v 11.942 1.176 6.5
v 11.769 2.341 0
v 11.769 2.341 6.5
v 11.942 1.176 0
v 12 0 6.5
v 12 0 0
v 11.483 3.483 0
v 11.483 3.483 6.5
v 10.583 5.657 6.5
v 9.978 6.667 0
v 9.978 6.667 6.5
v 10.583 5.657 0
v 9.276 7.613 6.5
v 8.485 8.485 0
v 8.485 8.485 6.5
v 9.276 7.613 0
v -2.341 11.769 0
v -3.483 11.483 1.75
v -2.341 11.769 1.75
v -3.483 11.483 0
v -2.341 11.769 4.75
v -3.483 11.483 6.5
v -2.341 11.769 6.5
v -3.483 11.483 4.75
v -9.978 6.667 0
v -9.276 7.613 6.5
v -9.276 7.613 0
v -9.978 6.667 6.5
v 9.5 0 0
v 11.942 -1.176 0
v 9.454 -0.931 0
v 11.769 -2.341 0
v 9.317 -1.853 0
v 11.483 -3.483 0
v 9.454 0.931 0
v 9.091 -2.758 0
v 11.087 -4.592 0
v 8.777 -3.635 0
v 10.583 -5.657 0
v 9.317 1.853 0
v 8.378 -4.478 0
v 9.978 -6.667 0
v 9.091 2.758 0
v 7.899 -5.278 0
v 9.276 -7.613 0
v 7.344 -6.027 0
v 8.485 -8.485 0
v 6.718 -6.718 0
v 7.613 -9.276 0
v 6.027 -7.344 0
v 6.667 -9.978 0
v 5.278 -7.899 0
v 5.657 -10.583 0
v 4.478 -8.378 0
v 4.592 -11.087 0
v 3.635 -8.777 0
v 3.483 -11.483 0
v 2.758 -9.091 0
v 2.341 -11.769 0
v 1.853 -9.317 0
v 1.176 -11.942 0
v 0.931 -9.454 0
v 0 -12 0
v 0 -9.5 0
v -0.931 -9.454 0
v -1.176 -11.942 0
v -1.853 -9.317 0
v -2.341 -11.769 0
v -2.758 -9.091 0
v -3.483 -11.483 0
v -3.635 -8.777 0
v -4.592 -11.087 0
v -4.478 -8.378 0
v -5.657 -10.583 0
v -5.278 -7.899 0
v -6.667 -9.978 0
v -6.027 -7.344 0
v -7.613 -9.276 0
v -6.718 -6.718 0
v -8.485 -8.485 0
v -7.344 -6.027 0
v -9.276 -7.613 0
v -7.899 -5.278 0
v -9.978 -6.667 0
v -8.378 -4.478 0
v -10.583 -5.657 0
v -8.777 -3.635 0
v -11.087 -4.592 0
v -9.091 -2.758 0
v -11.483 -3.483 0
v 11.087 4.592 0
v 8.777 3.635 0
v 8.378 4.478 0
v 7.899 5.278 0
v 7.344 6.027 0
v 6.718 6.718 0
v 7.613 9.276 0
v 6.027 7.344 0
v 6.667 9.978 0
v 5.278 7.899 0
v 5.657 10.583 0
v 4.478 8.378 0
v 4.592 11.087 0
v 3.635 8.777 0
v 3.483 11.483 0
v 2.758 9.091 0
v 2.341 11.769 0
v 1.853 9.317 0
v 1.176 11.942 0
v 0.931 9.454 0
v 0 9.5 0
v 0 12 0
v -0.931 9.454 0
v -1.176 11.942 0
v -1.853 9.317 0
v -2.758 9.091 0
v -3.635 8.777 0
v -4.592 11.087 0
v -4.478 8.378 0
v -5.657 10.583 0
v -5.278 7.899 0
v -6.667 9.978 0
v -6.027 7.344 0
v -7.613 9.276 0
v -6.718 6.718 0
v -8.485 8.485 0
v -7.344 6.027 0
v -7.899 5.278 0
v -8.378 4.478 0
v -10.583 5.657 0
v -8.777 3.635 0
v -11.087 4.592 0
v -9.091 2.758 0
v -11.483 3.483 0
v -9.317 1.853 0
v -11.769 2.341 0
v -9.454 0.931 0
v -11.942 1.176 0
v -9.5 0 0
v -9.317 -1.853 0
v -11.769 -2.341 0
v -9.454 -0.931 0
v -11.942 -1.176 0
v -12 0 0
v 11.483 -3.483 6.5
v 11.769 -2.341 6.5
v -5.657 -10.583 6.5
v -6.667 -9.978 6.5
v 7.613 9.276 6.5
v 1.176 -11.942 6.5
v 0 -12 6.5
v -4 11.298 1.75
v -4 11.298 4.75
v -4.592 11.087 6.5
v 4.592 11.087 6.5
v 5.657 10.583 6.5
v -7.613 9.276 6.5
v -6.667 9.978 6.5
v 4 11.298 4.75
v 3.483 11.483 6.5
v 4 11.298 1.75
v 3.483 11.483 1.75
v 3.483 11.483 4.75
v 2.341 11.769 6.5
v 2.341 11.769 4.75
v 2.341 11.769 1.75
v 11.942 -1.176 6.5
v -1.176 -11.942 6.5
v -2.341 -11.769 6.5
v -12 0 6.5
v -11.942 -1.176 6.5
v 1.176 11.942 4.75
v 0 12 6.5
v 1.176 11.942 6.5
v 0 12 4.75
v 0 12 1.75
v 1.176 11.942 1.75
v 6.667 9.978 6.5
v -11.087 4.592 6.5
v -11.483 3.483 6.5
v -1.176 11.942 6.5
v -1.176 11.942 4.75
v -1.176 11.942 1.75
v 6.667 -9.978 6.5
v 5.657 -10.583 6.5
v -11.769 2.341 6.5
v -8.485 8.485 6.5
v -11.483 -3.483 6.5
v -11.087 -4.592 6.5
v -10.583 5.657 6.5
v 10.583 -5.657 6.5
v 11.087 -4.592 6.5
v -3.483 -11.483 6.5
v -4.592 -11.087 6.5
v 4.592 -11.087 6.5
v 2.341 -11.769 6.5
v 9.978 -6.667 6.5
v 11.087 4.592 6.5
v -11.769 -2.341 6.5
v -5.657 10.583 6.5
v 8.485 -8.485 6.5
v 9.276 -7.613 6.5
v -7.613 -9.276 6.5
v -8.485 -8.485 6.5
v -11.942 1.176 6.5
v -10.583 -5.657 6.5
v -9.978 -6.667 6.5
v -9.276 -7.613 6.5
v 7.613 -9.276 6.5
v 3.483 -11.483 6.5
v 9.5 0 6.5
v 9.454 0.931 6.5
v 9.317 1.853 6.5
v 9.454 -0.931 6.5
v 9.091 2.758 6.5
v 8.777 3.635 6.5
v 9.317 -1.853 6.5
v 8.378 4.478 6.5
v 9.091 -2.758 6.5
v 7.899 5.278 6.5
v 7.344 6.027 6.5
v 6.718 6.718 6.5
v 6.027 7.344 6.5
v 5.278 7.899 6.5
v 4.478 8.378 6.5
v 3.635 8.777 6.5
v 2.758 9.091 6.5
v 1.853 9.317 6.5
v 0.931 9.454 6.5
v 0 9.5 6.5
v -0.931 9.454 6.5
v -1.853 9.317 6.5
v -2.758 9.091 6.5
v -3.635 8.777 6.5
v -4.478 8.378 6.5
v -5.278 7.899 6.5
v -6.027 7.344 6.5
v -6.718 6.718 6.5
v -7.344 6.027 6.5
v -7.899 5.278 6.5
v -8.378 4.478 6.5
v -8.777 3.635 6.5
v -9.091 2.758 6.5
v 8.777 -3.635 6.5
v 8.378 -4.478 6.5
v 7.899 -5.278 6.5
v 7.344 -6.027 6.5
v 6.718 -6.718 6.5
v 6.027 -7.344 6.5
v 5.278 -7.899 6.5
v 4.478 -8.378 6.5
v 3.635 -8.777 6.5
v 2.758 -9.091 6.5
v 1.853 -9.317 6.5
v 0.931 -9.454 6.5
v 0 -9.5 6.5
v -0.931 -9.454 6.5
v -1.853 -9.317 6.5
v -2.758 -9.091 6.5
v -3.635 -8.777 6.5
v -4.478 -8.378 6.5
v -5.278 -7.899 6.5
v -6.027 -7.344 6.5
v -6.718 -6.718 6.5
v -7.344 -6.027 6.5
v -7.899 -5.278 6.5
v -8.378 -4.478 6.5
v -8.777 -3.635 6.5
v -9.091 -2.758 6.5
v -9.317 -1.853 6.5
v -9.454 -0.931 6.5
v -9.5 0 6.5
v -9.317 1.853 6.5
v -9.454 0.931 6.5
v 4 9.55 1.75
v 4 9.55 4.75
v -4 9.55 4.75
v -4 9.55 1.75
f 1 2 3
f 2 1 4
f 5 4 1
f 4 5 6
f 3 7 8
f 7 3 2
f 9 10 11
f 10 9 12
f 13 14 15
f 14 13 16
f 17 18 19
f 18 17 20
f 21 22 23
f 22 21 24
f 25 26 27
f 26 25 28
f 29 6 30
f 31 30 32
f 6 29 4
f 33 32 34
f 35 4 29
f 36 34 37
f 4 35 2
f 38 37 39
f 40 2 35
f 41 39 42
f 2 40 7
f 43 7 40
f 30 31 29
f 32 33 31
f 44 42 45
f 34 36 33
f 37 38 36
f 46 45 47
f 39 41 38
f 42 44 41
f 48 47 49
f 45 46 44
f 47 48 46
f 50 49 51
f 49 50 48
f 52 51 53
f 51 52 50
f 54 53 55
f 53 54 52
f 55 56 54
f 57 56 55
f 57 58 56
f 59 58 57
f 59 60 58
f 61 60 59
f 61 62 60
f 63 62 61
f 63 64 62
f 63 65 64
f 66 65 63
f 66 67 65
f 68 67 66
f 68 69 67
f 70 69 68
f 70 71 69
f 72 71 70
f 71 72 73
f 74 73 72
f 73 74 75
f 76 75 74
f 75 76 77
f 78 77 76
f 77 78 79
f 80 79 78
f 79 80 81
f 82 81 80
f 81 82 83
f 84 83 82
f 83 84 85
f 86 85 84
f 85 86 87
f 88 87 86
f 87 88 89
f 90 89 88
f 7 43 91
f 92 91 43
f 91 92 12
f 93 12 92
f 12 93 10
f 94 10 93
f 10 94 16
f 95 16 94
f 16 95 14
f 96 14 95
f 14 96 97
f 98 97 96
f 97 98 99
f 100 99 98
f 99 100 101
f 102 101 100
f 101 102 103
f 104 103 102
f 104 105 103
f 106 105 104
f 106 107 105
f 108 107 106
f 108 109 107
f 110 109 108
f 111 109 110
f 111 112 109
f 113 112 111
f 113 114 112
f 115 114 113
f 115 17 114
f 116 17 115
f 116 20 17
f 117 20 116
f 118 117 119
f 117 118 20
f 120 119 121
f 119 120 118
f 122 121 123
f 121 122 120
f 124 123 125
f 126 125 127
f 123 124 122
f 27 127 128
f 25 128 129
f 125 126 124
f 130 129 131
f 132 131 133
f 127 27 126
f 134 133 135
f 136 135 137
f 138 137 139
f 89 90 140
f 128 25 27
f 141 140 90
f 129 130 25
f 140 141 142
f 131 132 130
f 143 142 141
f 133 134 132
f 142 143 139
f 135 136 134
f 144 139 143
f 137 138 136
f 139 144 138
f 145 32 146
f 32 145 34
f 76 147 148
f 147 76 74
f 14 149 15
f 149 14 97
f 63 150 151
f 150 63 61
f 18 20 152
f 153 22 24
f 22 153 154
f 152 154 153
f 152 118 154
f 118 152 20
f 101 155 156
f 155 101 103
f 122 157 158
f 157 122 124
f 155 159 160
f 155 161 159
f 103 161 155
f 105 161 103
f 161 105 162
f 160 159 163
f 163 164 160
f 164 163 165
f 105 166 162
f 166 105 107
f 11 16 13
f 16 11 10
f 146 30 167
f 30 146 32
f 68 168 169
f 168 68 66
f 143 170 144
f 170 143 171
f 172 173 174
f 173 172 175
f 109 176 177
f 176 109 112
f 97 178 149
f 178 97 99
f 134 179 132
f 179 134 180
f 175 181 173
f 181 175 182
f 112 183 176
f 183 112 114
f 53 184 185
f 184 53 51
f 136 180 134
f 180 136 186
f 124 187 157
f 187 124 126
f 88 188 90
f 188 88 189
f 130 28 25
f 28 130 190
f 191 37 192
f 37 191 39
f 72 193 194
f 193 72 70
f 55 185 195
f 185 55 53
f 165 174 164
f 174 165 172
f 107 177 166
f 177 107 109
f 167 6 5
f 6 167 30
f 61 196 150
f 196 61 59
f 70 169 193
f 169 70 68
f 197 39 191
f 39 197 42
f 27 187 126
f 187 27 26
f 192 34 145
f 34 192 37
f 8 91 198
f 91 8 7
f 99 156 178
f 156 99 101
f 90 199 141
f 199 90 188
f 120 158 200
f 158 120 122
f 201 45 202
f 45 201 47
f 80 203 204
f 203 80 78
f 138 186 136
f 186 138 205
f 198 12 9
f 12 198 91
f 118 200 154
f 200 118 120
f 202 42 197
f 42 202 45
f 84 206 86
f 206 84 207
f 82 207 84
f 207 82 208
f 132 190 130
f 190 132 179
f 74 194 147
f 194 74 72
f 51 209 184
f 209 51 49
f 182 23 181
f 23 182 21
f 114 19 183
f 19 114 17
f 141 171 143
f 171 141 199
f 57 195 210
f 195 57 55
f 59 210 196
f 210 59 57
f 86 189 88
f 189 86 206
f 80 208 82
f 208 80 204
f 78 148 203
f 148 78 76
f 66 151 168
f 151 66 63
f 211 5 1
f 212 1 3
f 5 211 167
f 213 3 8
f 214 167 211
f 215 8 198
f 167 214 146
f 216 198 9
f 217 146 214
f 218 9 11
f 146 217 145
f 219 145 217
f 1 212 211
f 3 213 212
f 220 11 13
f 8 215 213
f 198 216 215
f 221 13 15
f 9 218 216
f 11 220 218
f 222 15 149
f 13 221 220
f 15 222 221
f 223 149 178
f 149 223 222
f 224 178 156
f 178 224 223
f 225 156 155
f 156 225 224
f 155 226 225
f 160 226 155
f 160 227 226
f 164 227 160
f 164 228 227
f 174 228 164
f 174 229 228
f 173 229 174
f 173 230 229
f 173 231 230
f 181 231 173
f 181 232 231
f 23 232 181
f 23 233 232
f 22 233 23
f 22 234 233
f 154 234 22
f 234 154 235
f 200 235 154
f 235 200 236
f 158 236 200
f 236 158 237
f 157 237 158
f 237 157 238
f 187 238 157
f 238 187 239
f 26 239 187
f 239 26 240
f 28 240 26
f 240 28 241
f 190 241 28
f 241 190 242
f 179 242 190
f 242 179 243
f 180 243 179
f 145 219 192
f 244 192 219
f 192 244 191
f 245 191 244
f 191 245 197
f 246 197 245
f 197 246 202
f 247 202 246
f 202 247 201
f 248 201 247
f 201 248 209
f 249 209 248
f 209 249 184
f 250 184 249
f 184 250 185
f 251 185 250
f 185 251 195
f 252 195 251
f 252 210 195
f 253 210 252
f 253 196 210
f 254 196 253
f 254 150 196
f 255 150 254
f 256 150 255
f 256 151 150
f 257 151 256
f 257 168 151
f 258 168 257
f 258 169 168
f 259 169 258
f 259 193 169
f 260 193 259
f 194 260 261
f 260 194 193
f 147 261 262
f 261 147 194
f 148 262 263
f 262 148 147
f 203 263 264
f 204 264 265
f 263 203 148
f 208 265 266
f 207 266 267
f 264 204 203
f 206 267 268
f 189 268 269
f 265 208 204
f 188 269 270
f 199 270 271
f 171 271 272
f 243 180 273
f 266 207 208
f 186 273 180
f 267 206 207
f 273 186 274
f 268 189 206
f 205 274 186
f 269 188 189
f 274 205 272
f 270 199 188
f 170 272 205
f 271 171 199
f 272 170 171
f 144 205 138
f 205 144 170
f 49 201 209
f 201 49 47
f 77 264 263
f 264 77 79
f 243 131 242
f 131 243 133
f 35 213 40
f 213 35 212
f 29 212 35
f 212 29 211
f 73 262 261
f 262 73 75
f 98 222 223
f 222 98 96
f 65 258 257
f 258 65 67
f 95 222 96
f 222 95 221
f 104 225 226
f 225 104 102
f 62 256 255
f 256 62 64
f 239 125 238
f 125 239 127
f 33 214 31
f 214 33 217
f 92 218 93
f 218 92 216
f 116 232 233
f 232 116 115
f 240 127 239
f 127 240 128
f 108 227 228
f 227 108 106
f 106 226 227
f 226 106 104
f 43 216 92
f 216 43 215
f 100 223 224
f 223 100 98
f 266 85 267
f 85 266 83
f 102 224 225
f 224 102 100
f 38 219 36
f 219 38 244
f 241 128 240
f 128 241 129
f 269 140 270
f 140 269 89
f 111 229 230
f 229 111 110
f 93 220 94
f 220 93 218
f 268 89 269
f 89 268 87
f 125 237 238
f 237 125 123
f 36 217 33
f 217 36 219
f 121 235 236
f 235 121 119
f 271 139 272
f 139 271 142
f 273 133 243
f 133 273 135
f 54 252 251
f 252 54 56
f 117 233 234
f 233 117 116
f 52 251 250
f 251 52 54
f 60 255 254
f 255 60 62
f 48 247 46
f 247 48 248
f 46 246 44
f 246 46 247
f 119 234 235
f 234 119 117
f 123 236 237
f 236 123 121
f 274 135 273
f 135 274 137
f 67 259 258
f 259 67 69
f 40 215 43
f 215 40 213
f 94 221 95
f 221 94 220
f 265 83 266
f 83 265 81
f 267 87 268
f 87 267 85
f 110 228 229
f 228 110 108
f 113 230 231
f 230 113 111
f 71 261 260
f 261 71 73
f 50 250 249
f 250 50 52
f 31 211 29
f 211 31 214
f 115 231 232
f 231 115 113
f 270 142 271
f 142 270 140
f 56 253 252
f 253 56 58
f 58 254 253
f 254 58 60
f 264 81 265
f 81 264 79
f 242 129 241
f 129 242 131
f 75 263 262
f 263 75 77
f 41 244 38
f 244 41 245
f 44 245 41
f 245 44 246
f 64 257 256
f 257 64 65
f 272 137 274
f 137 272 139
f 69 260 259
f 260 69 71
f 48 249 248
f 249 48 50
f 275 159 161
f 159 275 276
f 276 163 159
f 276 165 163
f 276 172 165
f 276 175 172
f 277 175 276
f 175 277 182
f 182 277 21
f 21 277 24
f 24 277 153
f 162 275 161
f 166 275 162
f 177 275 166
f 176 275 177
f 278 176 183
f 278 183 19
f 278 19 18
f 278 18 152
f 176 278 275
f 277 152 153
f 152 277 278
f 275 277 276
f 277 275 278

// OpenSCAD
// Stream E — ring enclosure concept (digital). Ergonomics PENDING physical.
$fn = 64;
inner_r = 9.5;
outer_r = 12.0;
height = 6.5;
difference() {
  cylinder(h=height, r=outer_r);
  translate([0,0,-1]) cylinder(h=height+2, r=inner_r);
  translate([0, outer_r-1.2, height/2]) cube([8, 2.5, 3], center=true); // antenna window placeholder
}
